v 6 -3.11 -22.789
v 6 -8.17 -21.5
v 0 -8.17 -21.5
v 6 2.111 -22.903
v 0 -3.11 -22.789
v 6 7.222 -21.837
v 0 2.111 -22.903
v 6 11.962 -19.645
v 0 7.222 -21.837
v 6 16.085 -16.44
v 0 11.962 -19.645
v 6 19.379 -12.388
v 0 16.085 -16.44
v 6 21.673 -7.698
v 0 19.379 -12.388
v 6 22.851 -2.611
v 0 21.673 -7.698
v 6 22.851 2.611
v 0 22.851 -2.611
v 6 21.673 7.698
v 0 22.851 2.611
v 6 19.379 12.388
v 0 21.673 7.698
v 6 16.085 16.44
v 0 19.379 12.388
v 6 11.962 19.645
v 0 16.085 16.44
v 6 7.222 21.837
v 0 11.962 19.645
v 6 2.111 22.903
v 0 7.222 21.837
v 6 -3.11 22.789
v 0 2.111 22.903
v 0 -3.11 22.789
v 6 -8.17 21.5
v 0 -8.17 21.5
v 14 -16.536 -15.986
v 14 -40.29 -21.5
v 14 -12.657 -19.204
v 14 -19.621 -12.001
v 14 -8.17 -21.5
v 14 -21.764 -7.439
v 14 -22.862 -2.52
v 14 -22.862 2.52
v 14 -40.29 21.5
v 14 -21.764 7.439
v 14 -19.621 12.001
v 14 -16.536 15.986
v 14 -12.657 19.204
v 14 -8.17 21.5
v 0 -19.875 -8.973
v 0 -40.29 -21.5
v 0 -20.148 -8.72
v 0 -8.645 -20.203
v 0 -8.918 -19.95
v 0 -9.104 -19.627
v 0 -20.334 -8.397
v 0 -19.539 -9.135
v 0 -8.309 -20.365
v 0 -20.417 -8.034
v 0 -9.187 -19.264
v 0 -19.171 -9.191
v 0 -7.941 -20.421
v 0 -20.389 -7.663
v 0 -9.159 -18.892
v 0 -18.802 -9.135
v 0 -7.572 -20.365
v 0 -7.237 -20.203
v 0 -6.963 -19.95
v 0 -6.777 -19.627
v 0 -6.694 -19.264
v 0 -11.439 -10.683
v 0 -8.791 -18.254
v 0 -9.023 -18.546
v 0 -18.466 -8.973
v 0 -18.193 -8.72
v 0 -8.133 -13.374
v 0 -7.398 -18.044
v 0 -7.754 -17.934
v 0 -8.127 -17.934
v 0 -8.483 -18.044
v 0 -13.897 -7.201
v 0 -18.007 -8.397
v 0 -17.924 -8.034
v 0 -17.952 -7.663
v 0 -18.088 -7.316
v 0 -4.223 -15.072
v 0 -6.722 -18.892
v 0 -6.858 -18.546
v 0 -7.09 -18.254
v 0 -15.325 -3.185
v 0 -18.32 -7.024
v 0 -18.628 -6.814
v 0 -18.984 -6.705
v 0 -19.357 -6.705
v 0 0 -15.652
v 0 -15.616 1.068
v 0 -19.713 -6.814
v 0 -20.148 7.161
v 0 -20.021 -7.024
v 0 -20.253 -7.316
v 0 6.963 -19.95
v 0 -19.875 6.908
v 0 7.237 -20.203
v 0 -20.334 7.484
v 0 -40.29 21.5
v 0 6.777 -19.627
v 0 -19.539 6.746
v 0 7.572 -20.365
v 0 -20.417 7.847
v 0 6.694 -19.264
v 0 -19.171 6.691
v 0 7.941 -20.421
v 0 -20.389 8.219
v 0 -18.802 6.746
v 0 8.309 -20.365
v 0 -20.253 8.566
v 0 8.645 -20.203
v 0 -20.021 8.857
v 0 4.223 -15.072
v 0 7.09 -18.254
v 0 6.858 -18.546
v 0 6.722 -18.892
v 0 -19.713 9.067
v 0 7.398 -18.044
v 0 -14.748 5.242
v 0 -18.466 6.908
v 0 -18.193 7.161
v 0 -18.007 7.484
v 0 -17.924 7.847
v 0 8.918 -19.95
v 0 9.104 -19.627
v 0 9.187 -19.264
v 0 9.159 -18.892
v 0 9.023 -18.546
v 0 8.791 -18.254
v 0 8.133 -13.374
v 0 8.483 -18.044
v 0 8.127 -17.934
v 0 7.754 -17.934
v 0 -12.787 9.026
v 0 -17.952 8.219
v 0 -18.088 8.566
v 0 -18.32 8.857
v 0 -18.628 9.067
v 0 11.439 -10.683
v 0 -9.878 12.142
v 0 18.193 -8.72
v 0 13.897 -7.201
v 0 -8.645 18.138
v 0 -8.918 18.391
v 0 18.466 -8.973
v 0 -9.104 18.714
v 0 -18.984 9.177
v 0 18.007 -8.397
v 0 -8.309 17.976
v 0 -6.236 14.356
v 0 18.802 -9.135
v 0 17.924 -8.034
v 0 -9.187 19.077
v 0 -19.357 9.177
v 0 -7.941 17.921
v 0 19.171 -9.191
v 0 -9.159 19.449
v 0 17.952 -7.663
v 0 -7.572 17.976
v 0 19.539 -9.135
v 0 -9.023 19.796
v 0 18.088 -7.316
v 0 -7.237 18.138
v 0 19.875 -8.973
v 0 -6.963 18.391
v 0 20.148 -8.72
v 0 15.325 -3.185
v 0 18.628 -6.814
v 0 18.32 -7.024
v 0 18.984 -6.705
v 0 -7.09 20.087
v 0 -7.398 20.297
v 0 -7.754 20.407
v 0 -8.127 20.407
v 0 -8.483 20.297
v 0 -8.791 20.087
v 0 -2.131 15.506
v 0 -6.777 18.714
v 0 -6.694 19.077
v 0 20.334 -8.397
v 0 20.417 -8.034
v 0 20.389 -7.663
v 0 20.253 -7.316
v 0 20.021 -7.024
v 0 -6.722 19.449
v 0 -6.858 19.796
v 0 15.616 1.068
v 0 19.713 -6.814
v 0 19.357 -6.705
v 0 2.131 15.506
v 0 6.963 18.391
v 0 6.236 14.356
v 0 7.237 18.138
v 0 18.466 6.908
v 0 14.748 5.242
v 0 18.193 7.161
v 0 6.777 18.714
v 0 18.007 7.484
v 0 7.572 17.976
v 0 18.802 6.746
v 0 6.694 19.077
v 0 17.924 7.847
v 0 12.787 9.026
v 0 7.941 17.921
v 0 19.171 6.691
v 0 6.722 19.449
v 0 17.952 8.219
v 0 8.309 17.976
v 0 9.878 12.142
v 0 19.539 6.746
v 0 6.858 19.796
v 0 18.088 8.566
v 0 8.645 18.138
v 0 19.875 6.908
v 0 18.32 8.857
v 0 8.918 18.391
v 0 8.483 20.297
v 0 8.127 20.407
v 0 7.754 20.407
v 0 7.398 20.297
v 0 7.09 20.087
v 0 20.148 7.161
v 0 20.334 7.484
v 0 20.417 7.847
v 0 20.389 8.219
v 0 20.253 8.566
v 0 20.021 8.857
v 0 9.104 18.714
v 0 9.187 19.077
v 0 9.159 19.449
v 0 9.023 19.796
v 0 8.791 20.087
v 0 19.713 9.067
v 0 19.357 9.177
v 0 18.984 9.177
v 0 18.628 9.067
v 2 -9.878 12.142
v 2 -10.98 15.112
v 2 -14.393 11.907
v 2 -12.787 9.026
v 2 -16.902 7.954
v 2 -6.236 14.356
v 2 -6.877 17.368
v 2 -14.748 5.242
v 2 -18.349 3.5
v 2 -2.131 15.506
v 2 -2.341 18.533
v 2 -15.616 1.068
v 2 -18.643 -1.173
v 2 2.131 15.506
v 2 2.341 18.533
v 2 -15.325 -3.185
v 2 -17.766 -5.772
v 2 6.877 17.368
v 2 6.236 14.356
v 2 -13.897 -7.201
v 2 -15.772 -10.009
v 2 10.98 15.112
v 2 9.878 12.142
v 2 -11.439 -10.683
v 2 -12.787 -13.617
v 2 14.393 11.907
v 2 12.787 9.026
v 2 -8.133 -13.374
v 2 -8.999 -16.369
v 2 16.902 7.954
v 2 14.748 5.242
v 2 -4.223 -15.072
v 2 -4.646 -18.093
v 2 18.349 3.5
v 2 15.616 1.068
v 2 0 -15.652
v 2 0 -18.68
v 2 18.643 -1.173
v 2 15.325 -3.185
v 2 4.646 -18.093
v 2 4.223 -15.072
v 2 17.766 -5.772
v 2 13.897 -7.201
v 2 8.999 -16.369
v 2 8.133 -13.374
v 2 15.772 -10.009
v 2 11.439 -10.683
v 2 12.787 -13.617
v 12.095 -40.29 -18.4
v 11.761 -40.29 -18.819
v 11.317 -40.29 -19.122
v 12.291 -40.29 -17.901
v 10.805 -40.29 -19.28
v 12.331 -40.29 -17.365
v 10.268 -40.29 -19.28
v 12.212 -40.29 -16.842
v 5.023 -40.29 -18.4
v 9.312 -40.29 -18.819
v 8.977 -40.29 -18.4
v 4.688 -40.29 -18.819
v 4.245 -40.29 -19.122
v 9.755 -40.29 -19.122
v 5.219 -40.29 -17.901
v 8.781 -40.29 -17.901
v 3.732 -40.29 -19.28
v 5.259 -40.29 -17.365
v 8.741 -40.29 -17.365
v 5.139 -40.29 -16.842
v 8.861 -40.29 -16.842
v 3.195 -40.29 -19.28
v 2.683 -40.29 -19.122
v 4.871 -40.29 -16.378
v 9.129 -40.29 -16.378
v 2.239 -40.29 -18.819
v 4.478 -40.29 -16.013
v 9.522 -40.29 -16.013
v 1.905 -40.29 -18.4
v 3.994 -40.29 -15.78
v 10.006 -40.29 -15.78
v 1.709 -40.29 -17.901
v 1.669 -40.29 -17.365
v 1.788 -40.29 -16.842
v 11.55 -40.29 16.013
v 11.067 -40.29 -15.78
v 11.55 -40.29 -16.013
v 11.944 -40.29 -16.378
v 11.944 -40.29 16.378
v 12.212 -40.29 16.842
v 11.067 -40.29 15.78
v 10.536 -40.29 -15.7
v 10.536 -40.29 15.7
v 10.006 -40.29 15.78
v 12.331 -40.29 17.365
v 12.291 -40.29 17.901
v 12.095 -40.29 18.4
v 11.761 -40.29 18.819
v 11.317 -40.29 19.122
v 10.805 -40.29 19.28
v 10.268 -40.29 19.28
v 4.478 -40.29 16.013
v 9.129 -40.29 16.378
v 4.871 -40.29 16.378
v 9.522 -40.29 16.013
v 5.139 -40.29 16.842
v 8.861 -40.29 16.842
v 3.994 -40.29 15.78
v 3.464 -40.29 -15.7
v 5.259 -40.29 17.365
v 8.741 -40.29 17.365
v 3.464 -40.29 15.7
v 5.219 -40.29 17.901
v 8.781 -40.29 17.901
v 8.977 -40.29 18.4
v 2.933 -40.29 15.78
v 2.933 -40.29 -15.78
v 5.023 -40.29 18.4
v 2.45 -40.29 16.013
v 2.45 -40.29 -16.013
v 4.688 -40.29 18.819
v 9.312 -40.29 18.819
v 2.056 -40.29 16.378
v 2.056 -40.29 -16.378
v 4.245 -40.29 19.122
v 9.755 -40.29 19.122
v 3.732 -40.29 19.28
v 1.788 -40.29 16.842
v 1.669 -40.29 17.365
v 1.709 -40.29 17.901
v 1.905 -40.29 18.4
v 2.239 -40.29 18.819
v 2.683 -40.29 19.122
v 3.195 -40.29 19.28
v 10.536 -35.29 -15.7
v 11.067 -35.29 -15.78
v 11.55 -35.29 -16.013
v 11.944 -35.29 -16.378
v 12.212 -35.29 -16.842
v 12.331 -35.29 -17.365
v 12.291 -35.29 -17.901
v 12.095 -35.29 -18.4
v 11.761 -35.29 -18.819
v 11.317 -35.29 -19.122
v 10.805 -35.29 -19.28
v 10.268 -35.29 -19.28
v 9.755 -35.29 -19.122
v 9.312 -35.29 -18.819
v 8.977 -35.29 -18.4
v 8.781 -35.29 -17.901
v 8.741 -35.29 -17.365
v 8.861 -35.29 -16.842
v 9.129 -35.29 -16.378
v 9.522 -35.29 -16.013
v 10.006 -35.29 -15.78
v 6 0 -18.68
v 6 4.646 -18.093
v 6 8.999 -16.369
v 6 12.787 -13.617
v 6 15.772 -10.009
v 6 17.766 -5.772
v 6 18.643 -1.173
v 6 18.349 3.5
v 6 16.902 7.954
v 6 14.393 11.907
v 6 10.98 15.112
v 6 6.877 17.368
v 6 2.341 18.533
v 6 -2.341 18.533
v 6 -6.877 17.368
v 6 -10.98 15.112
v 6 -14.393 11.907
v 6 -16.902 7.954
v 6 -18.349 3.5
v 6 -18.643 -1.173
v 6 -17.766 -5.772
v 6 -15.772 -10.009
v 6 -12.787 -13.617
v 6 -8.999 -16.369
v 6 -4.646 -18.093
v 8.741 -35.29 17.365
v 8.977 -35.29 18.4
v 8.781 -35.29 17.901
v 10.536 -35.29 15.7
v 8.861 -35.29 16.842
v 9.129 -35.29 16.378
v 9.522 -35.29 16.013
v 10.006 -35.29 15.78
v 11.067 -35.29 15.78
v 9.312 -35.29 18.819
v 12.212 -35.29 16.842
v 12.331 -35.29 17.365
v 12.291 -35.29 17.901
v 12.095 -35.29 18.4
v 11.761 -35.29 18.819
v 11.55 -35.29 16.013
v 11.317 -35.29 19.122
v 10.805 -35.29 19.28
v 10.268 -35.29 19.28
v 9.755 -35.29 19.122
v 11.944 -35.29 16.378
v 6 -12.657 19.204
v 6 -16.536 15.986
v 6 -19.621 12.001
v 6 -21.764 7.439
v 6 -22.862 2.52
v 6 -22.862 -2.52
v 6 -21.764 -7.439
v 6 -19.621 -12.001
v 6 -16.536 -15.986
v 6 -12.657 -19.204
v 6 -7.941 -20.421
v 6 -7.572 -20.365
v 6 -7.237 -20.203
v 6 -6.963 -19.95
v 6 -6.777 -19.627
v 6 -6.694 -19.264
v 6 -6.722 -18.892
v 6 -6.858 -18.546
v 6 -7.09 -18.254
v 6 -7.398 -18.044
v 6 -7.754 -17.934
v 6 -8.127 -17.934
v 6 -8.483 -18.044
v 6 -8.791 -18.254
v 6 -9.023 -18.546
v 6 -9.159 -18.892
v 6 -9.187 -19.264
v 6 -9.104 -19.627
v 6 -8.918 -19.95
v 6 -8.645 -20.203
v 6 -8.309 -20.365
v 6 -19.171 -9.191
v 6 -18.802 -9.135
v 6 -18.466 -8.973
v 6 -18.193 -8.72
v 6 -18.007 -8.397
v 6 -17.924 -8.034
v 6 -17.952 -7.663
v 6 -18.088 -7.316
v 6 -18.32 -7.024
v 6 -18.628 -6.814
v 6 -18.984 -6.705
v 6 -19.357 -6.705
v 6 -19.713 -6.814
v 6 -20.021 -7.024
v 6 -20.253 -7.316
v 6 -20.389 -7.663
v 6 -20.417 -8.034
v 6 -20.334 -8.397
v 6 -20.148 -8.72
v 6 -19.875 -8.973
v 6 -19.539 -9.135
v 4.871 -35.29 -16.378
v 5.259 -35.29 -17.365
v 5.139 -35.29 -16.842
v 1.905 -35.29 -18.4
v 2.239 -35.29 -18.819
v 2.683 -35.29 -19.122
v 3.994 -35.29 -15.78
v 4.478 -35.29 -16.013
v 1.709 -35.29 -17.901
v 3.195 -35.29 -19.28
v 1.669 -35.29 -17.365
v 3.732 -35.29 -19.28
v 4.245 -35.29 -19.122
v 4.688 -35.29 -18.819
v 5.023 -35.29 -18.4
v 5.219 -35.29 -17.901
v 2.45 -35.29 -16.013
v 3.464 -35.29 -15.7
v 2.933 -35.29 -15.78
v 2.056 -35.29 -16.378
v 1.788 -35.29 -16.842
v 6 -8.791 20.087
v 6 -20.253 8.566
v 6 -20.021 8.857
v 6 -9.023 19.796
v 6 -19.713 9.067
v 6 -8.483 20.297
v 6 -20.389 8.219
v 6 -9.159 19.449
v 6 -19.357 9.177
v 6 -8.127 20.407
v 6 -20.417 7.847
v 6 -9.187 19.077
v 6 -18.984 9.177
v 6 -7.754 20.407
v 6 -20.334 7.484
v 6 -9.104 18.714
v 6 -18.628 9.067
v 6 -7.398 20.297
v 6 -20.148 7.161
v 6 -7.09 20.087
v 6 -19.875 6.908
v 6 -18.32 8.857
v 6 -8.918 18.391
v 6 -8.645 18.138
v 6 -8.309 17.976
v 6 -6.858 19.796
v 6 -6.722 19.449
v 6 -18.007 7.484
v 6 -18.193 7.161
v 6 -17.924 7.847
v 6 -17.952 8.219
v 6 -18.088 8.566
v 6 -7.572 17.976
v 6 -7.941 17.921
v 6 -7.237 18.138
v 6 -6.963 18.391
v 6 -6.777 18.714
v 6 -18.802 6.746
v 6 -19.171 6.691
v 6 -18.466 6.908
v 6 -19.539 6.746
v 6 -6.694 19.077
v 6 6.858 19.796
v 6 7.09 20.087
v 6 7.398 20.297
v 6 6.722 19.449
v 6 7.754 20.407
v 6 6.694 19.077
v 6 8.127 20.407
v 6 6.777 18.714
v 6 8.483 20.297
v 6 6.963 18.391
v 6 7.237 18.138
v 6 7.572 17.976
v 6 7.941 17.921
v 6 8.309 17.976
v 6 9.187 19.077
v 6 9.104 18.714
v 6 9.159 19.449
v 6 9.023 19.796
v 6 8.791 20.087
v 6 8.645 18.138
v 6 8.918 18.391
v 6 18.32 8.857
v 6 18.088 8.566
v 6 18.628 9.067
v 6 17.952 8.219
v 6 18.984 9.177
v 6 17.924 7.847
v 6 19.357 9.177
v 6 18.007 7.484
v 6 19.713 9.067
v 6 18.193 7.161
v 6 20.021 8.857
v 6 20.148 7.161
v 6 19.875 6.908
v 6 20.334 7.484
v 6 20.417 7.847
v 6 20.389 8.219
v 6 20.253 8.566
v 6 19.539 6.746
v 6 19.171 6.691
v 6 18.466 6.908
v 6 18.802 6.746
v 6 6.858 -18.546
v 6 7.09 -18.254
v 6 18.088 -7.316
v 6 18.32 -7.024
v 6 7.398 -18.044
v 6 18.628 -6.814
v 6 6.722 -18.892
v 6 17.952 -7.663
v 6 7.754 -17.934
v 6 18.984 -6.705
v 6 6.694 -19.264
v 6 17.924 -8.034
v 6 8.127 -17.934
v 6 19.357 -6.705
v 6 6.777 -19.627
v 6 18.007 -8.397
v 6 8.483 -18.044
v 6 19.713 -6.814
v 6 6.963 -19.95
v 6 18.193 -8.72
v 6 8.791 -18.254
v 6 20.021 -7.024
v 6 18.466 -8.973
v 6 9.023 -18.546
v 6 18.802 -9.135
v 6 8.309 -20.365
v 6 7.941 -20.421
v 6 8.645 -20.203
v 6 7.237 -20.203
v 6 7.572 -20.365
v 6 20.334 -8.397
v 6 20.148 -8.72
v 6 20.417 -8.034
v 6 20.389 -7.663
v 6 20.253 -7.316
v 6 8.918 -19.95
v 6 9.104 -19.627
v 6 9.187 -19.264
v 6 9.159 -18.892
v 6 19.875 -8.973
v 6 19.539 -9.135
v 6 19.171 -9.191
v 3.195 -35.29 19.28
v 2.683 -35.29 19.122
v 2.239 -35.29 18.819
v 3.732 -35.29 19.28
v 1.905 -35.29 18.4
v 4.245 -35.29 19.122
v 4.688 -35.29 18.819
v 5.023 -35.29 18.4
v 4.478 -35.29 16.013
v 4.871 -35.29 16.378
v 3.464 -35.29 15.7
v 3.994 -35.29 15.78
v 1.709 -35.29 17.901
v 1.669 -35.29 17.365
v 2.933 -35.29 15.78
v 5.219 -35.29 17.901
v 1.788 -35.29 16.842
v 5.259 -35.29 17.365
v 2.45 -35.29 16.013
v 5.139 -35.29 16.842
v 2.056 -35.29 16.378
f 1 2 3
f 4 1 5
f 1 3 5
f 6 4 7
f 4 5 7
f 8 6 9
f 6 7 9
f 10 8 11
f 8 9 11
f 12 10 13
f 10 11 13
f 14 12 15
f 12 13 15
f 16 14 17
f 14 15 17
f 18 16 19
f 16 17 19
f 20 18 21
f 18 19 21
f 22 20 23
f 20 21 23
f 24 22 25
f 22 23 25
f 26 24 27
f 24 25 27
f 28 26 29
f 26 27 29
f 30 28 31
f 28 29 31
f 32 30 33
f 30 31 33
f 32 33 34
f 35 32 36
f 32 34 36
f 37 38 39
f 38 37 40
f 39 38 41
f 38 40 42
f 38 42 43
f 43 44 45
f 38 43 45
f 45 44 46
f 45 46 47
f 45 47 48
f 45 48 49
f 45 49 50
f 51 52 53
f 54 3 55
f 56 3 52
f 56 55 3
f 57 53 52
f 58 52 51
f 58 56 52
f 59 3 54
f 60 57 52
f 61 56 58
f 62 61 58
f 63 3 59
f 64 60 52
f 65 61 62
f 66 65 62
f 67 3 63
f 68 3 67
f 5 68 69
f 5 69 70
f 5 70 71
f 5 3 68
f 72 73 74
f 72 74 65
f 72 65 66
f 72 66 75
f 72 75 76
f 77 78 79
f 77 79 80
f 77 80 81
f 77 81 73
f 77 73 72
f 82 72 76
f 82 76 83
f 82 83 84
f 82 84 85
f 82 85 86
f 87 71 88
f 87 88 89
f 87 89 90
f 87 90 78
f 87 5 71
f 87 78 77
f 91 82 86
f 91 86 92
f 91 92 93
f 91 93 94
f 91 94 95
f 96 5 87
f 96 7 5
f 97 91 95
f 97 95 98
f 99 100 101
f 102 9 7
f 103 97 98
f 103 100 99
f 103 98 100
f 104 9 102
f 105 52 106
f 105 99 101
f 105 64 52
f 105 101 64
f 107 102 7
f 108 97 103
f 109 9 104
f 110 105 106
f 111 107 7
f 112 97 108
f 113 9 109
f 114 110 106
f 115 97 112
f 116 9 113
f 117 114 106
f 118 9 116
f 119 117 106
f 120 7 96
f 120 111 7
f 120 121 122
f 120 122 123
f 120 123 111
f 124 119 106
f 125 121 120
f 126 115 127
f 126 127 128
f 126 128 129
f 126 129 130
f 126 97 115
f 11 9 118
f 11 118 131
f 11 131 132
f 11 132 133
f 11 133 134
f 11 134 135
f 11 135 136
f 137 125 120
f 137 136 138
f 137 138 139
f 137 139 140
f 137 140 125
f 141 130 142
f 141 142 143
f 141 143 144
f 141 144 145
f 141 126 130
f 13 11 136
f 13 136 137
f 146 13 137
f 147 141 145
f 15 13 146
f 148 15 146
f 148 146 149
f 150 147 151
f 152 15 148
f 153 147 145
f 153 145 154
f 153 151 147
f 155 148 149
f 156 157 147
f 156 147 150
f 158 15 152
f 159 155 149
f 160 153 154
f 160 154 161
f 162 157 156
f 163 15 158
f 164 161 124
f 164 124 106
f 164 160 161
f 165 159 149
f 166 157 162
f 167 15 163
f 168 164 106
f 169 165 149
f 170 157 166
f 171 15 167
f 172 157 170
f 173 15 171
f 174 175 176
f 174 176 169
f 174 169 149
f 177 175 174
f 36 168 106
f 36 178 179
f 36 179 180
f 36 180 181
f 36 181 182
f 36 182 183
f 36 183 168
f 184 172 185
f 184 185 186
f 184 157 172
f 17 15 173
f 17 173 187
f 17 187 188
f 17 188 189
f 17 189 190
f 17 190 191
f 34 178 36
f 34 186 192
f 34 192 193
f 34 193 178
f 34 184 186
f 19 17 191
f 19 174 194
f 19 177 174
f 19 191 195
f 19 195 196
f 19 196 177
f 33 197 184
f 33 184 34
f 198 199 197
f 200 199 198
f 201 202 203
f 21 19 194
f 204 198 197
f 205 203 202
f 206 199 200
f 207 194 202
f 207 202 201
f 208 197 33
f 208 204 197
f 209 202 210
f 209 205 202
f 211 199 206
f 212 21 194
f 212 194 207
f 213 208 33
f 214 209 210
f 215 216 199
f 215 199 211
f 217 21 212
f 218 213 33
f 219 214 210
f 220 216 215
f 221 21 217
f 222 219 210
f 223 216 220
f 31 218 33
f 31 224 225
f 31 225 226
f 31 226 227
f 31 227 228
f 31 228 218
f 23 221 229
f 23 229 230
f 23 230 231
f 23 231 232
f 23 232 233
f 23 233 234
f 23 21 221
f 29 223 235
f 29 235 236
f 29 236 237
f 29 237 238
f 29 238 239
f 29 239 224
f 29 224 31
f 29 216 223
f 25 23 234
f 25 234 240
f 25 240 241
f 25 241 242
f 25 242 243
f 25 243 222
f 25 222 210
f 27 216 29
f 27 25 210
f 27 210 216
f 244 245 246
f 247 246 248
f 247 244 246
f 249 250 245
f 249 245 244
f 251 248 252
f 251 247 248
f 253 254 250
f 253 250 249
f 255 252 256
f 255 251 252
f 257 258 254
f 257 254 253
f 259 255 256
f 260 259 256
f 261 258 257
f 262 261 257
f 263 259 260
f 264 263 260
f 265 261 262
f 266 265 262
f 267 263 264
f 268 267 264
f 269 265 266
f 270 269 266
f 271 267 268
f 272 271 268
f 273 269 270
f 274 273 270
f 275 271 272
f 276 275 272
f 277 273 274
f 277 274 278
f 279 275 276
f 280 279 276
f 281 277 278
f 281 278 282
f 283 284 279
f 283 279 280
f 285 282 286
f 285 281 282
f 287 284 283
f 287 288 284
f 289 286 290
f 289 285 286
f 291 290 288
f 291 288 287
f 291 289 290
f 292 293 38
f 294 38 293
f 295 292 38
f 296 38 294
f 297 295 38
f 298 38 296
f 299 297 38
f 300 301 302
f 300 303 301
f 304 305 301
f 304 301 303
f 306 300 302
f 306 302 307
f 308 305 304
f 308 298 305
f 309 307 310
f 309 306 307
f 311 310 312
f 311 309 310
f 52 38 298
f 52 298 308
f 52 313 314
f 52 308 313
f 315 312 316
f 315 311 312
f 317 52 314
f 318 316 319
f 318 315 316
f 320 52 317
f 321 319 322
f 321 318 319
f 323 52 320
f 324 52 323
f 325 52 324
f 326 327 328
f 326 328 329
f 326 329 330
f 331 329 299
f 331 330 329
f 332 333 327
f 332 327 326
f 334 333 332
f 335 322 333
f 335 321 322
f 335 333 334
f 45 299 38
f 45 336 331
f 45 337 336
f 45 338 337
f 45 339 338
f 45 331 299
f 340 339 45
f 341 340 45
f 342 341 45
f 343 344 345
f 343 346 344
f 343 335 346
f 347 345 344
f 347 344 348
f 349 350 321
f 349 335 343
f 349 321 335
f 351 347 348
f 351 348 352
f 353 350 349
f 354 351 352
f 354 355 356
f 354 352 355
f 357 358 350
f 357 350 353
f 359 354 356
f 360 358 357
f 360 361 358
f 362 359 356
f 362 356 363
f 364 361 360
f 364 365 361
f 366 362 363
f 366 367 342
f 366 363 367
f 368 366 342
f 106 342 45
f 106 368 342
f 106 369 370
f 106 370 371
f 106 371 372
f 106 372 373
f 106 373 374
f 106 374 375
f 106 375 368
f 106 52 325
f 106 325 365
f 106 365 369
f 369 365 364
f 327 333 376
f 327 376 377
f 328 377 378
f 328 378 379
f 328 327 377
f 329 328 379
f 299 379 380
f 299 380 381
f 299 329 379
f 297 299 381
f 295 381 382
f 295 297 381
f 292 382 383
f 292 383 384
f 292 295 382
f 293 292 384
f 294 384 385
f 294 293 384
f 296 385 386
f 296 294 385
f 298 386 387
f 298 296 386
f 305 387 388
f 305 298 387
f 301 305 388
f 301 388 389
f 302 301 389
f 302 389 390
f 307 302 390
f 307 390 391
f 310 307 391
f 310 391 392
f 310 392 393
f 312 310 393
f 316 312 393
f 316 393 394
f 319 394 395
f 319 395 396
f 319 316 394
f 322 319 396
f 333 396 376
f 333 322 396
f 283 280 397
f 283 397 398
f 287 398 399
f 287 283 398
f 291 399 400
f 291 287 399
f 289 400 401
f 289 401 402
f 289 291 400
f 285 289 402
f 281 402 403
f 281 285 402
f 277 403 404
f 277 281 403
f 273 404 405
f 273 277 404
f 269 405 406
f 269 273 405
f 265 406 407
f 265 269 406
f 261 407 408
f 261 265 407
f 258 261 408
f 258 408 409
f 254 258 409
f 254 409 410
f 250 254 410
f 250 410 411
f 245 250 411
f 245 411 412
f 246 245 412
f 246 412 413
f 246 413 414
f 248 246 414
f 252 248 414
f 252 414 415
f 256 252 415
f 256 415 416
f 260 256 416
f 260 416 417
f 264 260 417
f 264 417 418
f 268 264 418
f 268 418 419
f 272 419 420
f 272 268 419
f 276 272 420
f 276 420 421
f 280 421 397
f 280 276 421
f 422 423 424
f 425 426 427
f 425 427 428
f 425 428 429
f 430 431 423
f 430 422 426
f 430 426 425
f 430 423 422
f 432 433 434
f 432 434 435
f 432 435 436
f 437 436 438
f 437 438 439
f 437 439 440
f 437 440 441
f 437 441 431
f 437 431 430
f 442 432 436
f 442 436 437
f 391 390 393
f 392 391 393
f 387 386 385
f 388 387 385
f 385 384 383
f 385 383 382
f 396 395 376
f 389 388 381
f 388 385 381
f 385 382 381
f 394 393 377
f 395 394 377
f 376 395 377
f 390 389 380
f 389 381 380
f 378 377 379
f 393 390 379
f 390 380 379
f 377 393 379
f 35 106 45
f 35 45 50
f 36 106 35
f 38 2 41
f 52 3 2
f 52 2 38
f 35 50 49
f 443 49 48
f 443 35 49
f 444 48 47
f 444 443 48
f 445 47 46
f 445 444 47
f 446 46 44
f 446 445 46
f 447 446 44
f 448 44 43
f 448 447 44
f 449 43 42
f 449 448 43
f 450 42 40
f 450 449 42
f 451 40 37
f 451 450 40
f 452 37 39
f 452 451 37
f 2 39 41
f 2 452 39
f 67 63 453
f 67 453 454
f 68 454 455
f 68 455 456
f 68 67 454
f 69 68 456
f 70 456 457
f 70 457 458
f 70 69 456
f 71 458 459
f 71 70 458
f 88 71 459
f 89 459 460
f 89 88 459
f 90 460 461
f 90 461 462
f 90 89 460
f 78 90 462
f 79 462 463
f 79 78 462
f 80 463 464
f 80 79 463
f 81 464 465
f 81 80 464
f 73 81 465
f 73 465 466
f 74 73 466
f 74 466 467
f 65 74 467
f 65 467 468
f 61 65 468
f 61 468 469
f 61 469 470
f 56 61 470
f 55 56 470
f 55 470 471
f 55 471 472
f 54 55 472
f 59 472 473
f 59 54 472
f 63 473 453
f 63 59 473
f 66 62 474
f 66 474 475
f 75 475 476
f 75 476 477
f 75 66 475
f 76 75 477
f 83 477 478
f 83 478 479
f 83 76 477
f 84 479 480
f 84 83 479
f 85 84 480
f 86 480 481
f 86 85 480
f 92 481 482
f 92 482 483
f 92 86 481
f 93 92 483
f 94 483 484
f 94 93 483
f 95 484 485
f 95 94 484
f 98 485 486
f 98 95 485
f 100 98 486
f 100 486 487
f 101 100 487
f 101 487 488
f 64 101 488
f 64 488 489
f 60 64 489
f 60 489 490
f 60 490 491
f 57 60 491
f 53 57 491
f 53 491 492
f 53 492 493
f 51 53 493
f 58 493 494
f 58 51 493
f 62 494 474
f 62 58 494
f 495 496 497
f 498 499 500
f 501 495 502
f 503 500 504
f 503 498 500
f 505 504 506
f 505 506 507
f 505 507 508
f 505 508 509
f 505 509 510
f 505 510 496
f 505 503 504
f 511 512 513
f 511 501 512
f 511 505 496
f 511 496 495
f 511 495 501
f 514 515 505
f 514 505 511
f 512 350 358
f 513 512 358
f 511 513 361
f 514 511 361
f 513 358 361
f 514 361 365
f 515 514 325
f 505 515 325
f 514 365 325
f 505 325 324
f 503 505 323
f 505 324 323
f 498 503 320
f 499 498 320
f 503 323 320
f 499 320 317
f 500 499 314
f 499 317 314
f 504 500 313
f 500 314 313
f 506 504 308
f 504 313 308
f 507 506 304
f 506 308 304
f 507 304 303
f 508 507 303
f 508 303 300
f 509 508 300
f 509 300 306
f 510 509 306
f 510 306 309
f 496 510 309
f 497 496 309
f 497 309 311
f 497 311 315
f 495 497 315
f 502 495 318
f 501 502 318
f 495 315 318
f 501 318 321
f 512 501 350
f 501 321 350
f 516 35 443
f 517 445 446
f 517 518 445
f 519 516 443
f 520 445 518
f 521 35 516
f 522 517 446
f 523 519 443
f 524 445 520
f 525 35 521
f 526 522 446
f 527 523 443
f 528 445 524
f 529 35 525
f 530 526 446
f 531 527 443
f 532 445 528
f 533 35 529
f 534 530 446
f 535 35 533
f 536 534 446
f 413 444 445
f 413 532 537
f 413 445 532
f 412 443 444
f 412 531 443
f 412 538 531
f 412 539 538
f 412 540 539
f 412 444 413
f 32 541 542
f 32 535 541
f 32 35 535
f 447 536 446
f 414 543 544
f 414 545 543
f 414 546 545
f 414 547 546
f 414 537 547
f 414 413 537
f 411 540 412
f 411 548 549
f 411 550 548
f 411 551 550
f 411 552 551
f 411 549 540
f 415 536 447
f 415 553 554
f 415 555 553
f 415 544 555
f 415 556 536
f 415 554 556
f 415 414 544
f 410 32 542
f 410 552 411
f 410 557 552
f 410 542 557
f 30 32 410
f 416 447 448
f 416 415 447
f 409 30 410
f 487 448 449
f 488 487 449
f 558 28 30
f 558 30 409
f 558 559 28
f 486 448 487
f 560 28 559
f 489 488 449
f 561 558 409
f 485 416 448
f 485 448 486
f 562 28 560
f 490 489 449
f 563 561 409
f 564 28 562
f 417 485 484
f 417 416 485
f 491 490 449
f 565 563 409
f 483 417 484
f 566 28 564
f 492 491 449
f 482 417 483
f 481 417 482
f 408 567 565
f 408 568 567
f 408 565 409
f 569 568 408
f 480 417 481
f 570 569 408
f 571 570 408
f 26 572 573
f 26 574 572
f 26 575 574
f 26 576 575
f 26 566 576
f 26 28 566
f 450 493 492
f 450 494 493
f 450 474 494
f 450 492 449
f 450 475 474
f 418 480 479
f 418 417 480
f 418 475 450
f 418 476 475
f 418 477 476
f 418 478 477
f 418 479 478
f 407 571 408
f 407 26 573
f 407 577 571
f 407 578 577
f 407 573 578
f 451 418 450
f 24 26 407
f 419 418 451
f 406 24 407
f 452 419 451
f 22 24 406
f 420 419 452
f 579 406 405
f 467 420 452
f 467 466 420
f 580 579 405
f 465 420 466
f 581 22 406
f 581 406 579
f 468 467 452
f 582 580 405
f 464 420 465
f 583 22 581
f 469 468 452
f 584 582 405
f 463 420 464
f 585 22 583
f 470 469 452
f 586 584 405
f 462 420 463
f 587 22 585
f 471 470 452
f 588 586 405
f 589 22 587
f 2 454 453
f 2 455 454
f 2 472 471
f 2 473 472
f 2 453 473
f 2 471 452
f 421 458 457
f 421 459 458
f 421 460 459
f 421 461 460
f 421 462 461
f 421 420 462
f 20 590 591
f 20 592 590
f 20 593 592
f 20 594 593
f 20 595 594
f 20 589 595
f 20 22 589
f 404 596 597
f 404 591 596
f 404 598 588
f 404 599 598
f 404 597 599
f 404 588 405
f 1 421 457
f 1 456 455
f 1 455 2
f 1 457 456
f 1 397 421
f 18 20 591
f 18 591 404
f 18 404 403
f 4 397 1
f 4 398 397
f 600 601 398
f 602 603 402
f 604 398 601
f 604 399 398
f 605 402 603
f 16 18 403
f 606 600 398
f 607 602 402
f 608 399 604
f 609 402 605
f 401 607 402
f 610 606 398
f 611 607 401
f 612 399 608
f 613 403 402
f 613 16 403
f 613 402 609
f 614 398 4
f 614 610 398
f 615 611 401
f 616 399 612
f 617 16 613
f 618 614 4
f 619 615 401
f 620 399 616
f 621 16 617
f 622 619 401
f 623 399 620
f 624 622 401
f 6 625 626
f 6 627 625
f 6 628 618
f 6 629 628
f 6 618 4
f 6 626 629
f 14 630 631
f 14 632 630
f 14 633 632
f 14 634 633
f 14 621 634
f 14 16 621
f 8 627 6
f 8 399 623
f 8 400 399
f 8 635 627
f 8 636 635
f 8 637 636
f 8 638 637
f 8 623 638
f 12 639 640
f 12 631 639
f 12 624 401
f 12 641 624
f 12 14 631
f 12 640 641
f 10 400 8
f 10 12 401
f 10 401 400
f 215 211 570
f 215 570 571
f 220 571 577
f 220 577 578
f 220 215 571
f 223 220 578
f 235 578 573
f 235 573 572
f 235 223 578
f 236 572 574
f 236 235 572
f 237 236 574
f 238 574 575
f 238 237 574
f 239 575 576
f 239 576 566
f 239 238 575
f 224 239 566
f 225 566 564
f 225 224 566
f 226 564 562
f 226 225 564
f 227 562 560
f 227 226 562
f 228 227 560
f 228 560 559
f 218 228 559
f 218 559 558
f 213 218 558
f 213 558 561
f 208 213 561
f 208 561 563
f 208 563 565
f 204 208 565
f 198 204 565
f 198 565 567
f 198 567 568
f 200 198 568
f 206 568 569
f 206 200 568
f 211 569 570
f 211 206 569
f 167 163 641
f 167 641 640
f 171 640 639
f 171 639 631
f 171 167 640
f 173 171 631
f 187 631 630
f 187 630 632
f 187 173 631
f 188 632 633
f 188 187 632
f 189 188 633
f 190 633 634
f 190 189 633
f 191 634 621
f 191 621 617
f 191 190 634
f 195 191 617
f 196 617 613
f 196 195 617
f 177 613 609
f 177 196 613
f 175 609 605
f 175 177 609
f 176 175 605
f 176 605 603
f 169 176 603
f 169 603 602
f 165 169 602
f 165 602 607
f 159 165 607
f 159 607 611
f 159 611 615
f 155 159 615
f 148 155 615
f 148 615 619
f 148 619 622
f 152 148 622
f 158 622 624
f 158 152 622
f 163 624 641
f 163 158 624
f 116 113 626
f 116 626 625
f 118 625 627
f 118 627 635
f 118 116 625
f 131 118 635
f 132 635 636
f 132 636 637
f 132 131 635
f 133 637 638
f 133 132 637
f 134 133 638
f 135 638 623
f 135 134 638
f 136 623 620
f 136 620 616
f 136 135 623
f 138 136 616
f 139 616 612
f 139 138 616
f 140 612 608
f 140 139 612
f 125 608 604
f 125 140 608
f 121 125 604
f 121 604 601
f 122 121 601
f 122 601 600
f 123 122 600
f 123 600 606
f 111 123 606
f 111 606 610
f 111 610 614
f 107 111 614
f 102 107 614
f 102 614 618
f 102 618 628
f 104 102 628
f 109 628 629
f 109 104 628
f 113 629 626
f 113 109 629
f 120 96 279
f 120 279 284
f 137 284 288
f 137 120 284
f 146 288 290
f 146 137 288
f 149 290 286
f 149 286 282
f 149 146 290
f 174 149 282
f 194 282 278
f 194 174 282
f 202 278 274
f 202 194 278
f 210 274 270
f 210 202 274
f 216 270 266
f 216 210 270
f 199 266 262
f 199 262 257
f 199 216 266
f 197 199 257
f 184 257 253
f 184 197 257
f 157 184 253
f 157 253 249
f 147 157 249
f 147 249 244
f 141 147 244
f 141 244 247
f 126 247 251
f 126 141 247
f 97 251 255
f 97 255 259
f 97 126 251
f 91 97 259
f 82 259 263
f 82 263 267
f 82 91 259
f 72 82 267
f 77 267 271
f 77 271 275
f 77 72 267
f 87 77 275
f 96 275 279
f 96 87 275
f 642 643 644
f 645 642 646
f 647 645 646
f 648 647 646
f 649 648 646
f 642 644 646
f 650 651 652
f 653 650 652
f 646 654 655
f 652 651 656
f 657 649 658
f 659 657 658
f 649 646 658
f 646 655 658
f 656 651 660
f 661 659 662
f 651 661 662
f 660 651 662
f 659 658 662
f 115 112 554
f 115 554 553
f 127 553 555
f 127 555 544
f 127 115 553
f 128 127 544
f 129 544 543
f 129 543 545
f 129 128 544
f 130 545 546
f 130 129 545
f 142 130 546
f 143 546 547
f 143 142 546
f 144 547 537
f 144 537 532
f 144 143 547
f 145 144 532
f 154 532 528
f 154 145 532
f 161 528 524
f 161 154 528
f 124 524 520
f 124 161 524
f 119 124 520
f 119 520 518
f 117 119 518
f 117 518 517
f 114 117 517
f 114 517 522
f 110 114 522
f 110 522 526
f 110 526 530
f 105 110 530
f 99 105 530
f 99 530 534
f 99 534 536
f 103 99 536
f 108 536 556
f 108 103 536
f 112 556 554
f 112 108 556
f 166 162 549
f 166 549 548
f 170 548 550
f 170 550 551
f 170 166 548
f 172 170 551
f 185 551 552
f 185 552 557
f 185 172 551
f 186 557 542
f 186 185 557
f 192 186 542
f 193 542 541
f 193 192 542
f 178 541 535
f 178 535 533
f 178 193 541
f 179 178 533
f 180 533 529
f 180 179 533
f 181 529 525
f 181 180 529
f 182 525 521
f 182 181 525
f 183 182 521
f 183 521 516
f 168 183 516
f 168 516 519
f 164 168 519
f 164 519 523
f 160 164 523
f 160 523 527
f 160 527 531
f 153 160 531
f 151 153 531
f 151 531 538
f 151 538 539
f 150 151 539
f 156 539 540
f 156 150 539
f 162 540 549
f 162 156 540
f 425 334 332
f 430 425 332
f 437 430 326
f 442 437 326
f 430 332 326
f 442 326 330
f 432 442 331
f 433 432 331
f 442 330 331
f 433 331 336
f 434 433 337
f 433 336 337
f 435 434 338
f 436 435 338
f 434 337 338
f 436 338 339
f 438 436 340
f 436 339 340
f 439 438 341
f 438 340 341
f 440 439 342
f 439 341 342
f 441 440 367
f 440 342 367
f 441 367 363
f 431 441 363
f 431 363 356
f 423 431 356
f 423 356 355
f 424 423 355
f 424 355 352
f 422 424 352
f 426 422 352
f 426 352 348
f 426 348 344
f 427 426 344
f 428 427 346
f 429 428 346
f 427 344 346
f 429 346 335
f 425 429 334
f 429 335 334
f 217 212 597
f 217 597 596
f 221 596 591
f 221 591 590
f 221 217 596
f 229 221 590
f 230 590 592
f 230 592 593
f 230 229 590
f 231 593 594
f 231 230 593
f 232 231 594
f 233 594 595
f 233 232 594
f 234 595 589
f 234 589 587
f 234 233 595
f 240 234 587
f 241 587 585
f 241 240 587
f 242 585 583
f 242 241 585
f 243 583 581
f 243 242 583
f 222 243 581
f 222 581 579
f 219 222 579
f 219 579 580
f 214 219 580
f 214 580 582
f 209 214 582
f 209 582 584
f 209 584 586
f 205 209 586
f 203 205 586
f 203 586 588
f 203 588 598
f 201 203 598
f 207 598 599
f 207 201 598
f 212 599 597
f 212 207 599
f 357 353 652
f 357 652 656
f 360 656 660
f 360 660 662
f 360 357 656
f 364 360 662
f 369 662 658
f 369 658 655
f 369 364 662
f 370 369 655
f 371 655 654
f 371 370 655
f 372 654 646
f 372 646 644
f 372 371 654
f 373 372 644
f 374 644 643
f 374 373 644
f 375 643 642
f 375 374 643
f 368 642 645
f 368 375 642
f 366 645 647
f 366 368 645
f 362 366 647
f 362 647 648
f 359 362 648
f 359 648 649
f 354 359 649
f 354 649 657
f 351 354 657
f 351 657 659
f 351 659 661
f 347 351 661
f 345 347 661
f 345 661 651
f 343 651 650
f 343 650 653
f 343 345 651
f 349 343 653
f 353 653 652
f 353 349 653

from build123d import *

# Parameters (mm, degrees)
SKETCH_1_R               = 18.68
SKETCH_1_R_2             = 15.652173913
EXTRUDE_2_DEPTH          = 2
SKETCH_1_4_R             = 23
SKETCH_1_4_R_2           = 1.25
SKETCH_1_4_R_3           = 18.68
EXTRUDE_3_DEPTH          = 6
EXTRUDE_4_DEPTH          = 14
SKETCH_4_R               = 1.8
CUT_EXTRUDE_1_DEPTH      = 5
MIRROR_2_COPY_1_SKETCH_R = 1.8
MIRROR_2_COPY_1_DEPTH    = 5
MIRROR_2_COPY_2_SKETCH_R = 1.8
MIRROR_2_COPY_2_DEPTH    = 5


with BuildPart() as part:
    # 草图1 → 凸台-拉伸2 (new body)
    with BuildSketch(Plane(origin=(0, 0, 0), x_dir=(0, 0, -1), z_dir=(1, 0, 0))):
        Circle(SKETCH_1_R)
        Circle(SKETCH_1_R_2, mode=Mode.SUBTRACT)
    extrude(amount=EXTRUDE_2_DEPTH)



with BuildPart() as body_2:
    # 草图1<4> → 凸台-拉伸3 (new body)
    with BuildSketch(Plane(origin=(0, 0, 0), x_dir=(0, 0, -1), z_dir=(1, 0, 0))):
        Circle(SKETCH_1_4_R)
        with Locations((-7.940681222, -19.1705003)):
            Circle(SKETCH_1_4_R_2, mode=Mode.SUBTRACT)
        with Locations((-19.1705003, -7.940681222)):
            Circle(SKETCH_1_4_R_2, mode=Mode.SUBTRACT)
        with Locations((7.940681222, -19.1705003)):
            Circle(SKETCH_1_4_R_2, mode=Mode.SUBTRACT)
        with Locations((19.1705003, -7.940681222)):
            Circle(SKETCH_1_4_R_2, mode=Mode.SUBTRACT)
        with Locations((-19.1705003, 7.940681222)):
            Circle(SKETCH_1_4_R_2, mode=Mode.SUBTRACT)
        with Locations((-7.940681222, 19.1705003)):
            Circle(SKETCH_1_4_R_2, mode=Mode.SUBTRACT)
        Circle(SKETCH_1_4_R_3, mode=Mode.SUBTRACT)
        with Locations((19.1705003, 7.940681222)):
            Circle(SKETCH_1_4_R_2, mode=Mode.SUBTRACT)
        with Locations((7.940681222, 19.1705003)):
            Circle(SKETCH_1_4_R_2, mode=Mode.SUBTRACT)
    extrude(amount=EXTRUDE_3_DEPTH)


with BuildPart() as part_1:
    add(part.part)

    add(body_2.part)  # 凸台-拉伸4 merges body 2
    # 草图2 → 凸台-拉伸4 (add)
    with BuildSketch(Plane.ZY):
        with BuildLine():
            Line((-21.5, -40.29), (21.5, -40.29))
            Line((21.5, -40.29), (21.5, -8.170067319))
            ThreePointArc((21.5, -8.170067319), (0, -23), (-21.5, -8.170067319))
            Line((-21.5, -8.170067319), (-21.5, -40.29))
        make_face()
    extrude(amount=-EXTRUDE_4_DEPTH)

    # 草图4 → 切除-拉伸1 (cut)
    with BuildSketch(Plane(origin=(0, -40.29, 0), x_dir=(-1, 0, 0), z_dir=(0, -1, 0))):
        with Locations((-10.536326609, -17.5)):
            Circle(SKETCH_4_R)
    cut_extrude_1 = extrude(amount=-CUT_EXTRUDE_1_DEPTH, mode=Mode.SUBTRACT)

    # 镜向1: 切除-拉伸1 across plane
    add(cut_extrude_1.mirror(Plane.XY), mode=Mode.SUBTRACT)

    # 镜向2 copy 1 sketch → 镜向2 copy 1 (cut)
    with BuildSketch(Plane(origin=(14, -40.29, 0), x_dir=(1, 0, 0), z_dir=(0, -1, 0))):
        with Locations((-10.536326609, -17.5)):
            Circle(MIRROR_2_COPY_1_SKETCH_R)
    extrude(amount=-MIRROR_2_COPY_1_DEPTH, mode=Mode.SUBTRACT)

    # 镜向2 copy 2 sketch → 镜向2 copy 2 (cut)
    with BuildSketch(Plane(origin=(14, -40.29, 0), x_dir=(1, 0, 0), z_dir=(0, -1, 0))):
        with Locations((-10.536326609, 17.5)):
            Circle(MIRROR_2_COPY_2_SKETCH_R)
    extrude(amount=-MIRROR_2_COPY_2_DEPTH, mode=Mode.SUBTRACT)


solid = part_1.part
